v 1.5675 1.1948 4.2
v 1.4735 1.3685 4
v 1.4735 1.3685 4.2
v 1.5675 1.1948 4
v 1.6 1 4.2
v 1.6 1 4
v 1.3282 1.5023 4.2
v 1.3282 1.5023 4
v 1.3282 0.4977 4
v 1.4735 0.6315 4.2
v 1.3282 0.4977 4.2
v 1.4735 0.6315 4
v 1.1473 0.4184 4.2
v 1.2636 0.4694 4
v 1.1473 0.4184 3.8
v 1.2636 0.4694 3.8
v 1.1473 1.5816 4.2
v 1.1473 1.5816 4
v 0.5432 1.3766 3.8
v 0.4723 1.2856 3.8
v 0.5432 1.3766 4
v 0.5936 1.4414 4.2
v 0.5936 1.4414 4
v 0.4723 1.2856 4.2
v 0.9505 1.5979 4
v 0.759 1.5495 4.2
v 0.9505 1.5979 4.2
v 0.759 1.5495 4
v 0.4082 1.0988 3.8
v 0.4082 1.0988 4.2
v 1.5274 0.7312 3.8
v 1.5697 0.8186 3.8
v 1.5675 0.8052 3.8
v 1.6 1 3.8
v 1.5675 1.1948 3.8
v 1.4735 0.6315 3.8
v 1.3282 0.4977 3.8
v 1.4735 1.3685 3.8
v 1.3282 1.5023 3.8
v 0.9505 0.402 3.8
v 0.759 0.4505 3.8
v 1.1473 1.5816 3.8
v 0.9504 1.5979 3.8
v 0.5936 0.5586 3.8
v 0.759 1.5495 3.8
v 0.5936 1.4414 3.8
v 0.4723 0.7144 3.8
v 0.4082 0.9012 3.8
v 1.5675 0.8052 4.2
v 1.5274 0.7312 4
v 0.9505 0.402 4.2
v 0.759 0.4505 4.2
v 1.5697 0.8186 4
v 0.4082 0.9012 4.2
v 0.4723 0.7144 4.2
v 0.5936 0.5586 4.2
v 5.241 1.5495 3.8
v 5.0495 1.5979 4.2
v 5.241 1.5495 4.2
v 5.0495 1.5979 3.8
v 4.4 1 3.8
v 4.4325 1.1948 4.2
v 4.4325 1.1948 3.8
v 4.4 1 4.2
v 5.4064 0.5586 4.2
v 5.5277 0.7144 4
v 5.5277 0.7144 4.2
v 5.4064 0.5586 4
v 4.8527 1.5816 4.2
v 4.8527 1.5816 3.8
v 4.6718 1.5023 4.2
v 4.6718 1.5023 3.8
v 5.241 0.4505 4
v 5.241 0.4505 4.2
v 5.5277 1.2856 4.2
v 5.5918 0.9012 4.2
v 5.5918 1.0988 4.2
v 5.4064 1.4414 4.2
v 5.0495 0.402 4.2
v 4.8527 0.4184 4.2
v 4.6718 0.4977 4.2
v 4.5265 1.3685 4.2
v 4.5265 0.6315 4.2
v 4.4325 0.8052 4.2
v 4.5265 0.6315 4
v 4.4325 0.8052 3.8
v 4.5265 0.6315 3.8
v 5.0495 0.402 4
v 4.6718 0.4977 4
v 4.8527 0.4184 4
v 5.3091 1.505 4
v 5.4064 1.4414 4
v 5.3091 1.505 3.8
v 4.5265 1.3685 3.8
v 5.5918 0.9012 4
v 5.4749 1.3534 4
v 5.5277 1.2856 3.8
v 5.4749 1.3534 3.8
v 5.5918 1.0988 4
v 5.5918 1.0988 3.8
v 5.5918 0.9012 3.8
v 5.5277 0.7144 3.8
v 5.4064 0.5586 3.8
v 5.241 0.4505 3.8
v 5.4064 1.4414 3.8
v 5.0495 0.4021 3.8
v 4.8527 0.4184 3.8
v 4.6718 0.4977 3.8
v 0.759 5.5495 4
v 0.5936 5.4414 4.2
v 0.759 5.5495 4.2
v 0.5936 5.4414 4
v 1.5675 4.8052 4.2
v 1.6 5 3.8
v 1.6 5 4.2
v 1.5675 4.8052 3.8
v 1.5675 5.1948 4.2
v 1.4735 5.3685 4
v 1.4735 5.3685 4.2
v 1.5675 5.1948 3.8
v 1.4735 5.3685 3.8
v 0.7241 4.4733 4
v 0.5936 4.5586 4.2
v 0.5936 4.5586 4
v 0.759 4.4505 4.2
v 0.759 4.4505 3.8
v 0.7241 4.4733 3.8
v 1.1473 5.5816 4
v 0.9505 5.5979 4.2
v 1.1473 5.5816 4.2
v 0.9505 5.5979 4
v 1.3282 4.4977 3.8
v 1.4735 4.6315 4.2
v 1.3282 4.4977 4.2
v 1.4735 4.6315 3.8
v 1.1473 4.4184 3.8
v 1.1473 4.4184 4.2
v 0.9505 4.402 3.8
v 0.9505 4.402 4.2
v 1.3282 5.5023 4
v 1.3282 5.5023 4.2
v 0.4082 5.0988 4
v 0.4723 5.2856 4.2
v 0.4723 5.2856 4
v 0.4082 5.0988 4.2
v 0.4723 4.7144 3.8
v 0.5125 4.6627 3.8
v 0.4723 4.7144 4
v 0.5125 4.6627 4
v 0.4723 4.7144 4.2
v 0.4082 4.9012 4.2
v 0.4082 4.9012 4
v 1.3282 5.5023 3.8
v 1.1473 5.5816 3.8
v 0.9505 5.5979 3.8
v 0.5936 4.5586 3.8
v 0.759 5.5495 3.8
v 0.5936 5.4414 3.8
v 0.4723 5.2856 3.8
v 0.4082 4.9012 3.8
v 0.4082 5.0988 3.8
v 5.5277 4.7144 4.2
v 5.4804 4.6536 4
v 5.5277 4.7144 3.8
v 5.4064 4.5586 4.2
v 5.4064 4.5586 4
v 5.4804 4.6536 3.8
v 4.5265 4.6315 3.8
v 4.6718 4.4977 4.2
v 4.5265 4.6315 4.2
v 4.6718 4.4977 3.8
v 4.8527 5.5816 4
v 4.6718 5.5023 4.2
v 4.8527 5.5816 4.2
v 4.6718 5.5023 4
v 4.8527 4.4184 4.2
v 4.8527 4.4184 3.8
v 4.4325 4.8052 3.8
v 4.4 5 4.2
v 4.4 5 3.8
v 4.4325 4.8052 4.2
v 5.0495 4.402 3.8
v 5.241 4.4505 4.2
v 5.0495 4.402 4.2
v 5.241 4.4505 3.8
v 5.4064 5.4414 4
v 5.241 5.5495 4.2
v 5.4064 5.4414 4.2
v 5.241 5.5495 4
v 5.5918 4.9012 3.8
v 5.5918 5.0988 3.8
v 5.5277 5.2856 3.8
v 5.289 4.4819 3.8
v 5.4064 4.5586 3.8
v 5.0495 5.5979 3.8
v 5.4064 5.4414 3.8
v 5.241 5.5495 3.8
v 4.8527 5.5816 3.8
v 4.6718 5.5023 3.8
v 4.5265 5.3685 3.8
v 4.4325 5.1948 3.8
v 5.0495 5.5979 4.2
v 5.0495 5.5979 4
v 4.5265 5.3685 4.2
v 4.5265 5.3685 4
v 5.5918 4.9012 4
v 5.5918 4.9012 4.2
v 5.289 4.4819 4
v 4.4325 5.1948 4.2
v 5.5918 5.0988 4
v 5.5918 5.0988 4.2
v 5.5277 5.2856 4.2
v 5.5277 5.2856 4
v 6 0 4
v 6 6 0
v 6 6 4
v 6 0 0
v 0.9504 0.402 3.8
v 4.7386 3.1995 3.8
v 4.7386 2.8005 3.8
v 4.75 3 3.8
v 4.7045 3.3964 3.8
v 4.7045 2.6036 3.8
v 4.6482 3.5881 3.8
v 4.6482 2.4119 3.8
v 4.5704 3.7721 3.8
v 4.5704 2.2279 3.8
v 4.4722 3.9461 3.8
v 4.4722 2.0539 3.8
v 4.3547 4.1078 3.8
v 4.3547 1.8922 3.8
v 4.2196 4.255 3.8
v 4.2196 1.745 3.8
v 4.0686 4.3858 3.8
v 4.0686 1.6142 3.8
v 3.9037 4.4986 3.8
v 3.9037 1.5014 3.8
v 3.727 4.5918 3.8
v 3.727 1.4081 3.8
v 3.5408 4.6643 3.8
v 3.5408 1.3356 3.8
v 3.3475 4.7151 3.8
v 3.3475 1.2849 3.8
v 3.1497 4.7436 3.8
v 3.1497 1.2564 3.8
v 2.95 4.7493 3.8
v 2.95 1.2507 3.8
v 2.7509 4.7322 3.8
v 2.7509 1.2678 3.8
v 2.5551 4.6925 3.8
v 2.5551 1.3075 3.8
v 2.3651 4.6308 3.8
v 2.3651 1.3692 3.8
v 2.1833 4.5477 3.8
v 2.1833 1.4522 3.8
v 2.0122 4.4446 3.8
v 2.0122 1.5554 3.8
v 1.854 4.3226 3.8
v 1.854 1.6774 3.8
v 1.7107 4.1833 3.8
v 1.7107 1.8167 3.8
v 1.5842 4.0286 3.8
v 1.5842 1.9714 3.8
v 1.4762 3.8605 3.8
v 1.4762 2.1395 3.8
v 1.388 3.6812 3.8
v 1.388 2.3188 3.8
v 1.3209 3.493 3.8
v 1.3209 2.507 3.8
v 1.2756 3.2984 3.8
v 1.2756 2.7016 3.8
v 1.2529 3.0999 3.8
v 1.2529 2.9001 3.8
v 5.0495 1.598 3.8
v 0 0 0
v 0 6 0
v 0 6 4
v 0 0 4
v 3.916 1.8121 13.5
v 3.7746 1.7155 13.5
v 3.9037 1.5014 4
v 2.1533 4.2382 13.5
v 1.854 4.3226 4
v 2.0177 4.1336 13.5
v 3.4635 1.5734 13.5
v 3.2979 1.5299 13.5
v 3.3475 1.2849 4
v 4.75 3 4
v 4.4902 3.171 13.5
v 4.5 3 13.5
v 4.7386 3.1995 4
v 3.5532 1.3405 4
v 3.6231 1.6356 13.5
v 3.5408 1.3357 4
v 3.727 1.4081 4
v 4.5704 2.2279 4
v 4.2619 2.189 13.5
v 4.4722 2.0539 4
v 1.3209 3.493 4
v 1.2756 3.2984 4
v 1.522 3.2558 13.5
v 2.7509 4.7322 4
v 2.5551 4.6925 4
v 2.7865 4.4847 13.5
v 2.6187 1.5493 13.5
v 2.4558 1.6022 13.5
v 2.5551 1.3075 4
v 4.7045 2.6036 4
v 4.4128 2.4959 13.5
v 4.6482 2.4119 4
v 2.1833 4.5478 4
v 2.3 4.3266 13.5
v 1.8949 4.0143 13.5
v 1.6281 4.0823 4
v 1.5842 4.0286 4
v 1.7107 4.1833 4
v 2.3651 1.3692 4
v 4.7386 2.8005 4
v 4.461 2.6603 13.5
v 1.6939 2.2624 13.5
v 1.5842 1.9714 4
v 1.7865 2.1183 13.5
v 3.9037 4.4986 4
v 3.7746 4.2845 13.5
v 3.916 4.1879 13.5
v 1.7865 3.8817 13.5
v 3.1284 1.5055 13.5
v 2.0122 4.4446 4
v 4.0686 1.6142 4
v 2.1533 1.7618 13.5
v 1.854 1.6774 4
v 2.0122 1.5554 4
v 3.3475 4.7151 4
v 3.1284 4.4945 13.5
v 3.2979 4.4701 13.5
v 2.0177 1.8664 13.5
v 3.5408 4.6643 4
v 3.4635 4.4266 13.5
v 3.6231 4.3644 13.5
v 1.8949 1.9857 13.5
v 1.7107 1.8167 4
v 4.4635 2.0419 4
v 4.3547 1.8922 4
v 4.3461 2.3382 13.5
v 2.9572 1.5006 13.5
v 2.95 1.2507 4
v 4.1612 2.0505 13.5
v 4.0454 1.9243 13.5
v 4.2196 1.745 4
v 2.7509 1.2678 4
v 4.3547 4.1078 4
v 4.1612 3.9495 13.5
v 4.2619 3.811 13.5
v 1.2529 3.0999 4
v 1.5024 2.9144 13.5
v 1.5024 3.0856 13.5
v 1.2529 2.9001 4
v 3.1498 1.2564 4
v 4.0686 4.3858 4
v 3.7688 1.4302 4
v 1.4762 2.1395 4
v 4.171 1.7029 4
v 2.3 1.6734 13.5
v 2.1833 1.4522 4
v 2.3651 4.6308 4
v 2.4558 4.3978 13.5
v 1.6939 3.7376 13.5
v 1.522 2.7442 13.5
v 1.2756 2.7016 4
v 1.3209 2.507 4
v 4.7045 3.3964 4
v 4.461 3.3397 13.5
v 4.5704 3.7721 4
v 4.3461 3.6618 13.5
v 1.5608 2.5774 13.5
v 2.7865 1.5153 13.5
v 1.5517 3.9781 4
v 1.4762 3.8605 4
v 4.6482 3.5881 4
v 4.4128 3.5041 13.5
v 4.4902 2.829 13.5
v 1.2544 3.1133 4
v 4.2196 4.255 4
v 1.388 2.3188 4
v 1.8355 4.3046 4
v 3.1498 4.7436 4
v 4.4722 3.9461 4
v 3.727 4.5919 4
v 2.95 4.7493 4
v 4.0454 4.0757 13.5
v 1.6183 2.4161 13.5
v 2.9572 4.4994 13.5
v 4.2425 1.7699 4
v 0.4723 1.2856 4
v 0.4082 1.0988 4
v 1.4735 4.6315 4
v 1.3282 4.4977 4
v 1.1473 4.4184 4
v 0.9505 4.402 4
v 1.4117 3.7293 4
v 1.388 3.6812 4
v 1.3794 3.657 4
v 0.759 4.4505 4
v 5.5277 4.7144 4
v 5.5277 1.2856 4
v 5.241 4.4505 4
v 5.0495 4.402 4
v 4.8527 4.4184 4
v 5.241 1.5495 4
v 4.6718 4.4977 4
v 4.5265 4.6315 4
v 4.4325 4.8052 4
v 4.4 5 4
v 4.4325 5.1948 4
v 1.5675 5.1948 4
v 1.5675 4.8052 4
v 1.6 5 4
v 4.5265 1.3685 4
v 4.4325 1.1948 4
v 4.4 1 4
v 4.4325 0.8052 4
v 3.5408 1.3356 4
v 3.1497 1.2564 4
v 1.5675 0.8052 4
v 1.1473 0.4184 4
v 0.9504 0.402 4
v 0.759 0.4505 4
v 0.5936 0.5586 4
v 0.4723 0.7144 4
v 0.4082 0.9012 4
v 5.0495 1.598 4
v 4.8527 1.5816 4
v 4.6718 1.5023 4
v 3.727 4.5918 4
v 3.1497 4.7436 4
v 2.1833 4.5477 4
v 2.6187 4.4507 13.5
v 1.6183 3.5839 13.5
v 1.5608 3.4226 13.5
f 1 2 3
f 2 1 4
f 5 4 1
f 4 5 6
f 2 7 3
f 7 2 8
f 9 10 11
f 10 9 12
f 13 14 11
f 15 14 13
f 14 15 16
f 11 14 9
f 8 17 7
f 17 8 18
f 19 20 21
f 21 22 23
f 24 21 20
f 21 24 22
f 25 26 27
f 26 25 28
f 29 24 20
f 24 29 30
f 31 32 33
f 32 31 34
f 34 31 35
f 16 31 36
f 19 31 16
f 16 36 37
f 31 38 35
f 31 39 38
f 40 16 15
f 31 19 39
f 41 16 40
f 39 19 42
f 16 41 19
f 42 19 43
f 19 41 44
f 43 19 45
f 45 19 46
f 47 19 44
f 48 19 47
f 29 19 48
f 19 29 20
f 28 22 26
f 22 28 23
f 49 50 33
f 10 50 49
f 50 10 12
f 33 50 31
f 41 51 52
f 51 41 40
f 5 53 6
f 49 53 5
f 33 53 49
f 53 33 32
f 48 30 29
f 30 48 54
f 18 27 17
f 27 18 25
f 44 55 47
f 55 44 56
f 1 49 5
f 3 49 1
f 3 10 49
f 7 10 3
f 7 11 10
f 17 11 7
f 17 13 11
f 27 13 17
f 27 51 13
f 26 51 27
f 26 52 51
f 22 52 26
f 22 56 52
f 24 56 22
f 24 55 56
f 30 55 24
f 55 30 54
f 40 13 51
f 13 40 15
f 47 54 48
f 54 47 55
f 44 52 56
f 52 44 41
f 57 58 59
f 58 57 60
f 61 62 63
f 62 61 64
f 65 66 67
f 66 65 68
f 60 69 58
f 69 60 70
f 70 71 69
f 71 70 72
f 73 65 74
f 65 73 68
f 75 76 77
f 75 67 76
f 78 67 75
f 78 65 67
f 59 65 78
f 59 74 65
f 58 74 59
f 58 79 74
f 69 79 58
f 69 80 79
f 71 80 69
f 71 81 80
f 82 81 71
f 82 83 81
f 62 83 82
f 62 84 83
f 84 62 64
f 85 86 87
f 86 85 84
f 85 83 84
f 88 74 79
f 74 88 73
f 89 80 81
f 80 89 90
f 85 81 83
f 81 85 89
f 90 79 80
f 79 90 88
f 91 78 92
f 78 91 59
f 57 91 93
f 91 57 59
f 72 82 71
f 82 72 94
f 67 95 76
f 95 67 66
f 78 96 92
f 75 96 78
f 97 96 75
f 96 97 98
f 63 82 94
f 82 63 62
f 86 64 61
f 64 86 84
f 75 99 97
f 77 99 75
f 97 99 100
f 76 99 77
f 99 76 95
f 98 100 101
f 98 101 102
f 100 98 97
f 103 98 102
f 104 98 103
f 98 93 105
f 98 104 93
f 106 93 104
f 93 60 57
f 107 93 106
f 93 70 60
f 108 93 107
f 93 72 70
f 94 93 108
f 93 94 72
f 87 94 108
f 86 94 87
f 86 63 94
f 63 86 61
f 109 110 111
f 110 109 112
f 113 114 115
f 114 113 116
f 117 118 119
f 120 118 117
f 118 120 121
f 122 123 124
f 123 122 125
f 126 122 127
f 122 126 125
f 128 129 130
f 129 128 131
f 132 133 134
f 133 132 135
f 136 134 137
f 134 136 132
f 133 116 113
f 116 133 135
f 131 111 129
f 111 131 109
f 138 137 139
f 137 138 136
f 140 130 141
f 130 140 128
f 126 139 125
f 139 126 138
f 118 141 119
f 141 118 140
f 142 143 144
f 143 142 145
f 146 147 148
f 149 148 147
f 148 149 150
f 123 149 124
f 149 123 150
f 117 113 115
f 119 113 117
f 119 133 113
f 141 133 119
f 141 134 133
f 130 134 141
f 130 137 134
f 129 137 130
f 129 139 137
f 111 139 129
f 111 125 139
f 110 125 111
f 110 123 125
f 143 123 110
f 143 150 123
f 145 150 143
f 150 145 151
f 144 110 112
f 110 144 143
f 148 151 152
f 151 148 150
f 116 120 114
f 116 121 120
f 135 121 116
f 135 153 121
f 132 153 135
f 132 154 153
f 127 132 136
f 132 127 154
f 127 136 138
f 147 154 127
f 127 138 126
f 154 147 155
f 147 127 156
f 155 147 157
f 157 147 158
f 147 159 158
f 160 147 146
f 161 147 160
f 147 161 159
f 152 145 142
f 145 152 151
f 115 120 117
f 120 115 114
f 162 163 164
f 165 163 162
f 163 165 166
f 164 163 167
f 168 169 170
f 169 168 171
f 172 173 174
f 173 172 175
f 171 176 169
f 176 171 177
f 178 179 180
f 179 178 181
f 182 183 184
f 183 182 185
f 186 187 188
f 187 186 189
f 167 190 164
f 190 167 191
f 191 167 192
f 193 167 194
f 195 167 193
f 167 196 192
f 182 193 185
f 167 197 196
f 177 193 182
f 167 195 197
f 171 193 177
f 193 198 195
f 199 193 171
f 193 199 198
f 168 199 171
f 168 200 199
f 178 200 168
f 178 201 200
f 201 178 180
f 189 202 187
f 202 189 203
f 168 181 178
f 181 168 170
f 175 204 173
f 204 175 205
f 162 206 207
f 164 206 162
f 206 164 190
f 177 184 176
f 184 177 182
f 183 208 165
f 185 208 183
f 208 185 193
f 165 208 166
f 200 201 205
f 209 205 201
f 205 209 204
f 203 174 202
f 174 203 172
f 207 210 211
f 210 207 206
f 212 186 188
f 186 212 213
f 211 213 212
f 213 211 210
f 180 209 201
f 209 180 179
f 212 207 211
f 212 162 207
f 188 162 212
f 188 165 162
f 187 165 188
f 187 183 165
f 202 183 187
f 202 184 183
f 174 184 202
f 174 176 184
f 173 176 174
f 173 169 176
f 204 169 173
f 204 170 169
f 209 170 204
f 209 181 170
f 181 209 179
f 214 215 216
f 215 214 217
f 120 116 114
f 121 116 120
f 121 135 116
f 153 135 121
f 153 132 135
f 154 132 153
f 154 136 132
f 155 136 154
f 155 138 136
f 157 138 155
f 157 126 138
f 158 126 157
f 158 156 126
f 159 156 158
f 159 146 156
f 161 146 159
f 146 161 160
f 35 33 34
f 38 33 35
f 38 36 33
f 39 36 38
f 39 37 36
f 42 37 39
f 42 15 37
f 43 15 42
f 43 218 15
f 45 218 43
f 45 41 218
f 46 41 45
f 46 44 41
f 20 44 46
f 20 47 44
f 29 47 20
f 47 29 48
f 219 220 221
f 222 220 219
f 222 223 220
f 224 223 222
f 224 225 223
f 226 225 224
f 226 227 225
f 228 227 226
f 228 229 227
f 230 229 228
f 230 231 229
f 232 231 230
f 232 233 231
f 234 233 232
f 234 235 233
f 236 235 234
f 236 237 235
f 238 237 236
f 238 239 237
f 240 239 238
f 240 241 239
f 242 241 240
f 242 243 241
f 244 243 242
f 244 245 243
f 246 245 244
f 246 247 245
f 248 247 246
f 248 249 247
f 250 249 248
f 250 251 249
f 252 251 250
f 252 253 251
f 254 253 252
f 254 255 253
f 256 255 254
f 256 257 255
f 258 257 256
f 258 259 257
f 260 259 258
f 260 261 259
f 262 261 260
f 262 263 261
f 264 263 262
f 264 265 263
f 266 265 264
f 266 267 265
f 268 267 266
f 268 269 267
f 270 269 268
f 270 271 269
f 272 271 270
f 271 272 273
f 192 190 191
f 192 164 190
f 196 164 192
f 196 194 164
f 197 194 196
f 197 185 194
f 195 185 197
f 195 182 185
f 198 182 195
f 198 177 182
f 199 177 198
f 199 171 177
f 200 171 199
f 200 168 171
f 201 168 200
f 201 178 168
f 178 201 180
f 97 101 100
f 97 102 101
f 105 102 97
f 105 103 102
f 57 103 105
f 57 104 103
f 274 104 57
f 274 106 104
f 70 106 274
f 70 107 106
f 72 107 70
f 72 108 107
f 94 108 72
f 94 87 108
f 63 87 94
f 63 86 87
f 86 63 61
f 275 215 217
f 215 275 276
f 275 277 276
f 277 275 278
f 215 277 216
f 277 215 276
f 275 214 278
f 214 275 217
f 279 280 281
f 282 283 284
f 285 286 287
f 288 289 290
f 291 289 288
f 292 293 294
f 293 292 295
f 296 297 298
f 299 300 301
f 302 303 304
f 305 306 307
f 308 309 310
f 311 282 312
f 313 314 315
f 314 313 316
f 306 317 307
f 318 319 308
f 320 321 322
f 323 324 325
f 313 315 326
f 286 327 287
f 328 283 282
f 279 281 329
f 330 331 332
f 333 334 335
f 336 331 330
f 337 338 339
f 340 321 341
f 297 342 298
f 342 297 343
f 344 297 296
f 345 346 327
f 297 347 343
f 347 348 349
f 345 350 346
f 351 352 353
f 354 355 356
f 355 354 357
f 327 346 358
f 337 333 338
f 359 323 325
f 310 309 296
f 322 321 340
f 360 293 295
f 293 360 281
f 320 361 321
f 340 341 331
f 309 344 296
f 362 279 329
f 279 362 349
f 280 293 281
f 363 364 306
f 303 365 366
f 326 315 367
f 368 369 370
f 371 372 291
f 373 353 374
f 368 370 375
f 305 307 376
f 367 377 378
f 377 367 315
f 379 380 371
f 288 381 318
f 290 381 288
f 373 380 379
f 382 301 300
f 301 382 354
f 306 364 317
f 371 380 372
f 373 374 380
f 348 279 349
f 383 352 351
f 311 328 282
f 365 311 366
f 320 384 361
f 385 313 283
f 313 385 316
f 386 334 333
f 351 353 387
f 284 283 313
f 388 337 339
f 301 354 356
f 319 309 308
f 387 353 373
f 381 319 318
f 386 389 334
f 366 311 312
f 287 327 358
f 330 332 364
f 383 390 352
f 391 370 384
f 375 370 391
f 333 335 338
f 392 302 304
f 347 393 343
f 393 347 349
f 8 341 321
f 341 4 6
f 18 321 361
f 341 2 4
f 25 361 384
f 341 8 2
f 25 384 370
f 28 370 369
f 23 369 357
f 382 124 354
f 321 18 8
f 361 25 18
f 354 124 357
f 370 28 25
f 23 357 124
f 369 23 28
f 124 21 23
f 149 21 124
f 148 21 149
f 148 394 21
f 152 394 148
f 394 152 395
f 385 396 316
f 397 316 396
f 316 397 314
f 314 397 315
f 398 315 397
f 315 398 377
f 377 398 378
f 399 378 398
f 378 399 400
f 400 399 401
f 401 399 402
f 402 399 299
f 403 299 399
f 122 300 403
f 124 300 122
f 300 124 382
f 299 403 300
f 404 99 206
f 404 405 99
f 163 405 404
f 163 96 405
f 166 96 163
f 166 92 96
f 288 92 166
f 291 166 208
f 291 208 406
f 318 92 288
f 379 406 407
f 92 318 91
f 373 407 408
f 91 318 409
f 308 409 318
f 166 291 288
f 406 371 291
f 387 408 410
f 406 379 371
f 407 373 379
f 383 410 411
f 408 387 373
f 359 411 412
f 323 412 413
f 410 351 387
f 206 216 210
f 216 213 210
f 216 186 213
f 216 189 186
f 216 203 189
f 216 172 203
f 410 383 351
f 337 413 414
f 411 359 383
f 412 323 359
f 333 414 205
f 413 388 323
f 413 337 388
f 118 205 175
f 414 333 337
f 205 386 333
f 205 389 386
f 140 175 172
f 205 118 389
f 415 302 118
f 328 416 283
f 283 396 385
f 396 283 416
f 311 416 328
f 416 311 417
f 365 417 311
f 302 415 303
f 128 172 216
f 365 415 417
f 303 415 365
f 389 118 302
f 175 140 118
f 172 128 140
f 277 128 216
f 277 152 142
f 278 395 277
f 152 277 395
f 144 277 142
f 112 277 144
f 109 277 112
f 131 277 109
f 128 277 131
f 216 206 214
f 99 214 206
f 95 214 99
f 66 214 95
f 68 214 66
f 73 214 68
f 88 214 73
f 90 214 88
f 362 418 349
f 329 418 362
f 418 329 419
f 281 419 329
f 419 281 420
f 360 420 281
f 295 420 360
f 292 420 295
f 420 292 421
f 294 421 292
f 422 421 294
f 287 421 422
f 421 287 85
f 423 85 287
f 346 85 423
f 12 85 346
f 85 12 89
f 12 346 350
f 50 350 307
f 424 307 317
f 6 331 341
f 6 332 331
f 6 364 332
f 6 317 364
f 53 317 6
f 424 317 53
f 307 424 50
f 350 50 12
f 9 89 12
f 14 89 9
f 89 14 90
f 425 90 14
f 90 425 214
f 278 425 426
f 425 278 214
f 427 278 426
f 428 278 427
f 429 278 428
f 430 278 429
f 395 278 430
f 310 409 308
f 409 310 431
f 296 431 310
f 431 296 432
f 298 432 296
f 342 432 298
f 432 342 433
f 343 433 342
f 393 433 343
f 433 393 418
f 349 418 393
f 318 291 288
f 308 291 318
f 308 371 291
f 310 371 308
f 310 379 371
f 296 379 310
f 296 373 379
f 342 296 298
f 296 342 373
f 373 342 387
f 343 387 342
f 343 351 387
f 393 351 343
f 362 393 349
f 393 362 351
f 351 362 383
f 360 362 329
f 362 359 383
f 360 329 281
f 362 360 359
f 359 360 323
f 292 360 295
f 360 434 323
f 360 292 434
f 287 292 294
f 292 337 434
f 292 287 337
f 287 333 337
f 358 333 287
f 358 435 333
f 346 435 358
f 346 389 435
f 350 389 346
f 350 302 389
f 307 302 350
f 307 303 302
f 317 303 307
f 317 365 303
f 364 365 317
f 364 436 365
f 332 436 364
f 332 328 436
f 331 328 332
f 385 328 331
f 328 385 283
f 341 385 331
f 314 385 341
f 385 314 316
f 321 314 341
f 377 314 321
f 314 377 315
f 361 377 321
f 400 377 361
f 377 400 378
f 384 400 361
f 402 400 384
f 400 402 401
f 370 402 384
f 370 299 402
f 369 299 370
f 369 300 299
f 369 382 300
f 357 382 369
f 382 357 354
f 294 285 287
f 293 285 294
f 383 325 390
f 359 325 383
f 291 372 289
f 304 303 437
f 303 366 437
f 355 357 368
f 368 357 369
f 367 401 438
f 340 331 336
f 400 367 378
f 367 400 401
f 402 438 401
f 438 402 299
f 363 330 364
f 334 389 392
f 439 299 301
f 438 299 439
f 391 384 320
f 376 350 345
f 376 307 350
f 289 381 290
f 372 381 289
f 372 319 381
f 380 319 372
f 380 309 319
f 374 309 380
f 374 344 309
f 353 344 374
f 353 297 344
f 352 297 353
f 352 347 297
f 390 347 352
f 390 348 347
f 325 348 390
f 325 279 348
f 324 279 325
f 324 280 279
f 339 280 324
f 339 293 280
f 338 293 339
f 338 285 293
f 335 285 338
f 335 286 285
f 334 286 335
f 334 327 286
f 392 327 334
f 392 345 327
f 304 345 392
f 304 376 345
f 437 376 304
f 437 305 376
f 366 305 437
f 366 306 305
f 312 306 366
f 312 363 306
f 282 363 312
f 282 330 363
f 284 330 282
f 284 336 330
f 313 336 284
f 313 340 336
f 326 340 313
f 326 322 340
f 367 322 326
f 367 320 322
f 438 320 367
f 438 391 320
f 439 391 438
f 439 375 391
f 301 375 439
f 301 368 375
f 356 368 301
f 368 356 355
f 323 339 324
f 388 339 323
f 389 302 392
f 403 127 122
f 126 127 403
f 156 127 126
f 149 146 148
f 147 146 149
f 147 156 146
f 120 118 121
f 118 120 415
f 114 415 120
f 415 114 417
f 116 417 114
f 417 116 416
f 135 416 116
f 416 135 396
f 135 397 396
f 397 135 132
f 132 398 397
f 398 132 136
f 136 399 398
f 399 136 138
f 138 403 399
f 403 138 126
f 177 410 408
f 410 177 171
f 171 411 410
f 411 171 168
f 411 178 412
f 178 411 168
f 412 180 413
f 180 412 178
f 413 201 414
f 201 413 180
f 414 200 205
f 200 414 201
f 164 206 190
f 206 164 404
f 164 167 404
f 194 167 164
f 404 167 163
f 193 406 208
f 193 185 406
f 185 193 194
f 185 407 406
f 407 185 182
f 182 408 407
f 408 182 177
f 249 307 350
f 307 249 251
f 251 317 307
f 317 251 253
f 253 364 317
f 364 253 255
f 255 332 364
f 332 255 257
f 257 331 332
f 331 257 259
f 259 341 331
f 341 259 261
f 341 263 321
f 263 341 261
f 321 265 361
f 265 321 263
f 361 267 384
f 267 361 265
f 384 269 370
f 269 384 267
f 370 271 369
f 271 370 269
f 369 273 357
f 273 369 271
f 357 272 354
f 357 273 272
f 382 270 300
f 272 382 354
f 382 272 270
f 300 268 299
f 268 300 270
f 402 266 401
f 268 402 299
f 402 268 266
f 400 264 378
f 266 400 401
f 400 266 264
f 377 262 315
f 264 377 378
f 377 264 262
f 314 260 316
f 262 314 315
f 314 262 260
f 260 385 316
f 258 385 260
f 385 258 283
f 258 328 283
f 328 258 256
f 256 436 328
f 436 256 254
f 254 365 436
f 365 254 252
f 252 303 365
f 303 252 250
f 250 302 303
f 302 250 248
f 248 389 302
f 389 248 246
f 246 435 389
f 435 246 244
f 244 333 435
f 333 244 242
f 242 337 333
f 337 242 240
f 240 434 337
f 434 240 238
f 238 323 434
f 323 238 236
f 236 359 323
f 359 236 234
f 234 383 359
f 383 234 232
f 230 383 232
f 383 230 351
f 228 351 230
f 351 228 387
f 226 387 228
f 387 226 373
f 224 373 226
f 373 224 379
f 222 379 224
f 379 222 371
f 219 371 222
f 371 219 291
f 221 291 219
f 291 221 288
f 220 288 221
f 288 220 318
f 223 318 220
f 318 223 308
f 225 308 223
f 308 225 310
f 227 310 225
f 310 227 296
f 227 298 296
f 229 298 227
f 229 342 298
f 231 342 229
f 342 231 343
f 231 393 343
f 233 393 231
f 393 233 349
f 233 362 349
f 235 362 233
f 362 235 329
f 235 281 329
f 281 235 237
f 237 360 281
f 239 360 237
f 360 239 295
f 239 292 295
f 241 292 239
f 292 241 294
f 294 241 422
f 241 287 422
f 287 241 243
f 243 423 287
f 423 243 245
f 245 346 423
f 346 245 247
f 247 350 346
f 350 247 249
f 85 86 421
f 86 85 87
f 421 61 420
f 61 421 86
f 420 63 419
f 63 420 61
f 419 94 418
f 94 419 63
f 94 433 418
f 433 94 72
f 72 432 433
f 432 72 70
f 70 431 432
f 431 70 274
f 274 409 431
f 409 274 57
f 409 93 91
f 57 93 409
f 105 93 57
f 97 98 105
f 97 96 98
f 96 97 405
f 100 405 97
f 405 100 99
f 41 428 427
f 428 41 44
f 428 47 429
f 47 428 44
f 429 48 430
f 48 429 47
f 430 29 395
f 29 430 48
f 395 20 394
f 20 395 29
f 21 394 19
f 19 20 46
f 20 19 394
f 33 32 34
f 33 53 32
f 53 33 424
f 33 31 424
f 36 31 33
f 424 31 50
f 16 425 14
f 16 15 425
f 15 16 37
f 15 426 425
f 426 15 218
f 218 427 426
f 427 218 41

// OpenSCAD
use <bendlib.scad>;

function button(
    body_dim = undef, 
    mount_dim = undef, 
    pin_dim = undef,
    contact_dim = undef, 
    contact_offset = undef,
    contact_thickness = undef
 ) = let(
    body_dim = bl_def(body_dim, [12, 8.2, 4]),
    mount_dim = bl_def(mount_dim, [6.8, 2]),
    pin_dim = bl_def(pin_dim, [4.5, 2]),
    contact_dim = bl_def(contact_dim, [[13, 4, 0.5], [26, 2, 1]]),
    contact_offset = bl_def(contact_offset, [0,0,3]),
    contact_thickness = bl_def(contact_thickness, 0.2)
    
) [
    body_dim, 
    mount_dim,
    pin_dim,
    contact_dim,
    contact_offset,
    contact_thickness
];

function button_body_dim(type) = type[0];
function button_mount_dim(type) = type[1];
function button_pin_dim(type) = type[2];
function button_contact_dim(type) = type[3];
function button_contact_offset(type) = type[4];
function button_contact_thickness(type) = type[5];


module button_body_shape(type) {
    body_dim = button_body_dim(type);
    intersection() {
        circle(d = body_dim[0]);
        square(bl_2d(body_dim), center=true);
    }
}

module button_mount_diff(type, thickness, tolerance, thickness_tolerance = undef, part_offset = undef) {
    body_dim = button_body_dim(type);
    mount_dim = button_mount_dim(type);
    thickness_tolerance = bl_def(thickness_tolerance, tolerance);
    part_offset = bl_def(part_offset, thickness_tolerance);
    translate([0,0,body_dim[2]+part_offset-thickness_tolerance])
    cylinder(d = mount_dim[0] + tolerance*2, h = thickness + thickness_tolerance*2);
}

module button(type = button()) {
    
    body_dim = button_body_dim(type);
    mount_dim = button_mount_dim(type);
    pin_dim = button_pin_dim(type);
    
    color("black")
    linear_extrude(body_dim[2])
    button_body_shape(type);
    
    color("#111111")
    cylinder(d = mount_dim[0], h = mount_dim[1] + body_dim[2]);
    color("#222222")
    cylinder(d = pin_dim[0], h = pin_dim[1] + mount_dim[1] + body_dim[2]);
    
    
    translate(button_contact_offset(type))
    linear_extrude(button_contact_thickness(type))
    for (c = button_contact_dim(type)) {
        bl_square(c, radius = c[2], center=true);
    }
    
}

$fa = 0.2;
$fs = 0.2;

function push_button(dim = undef, dia = undef, height = undef) = [
    bl_def(dim, [6,6,4,0.2]), 
    bl_def(dia, [3.5,3,1.2]), 
    bl_def(height, 2)
];

function push_button_dim(type) = type[0];
function push_button_dia(type) = type[1];
function push_button_height(type) = type[2];

module push_button(type = push_button()) {
    
    dim = push_button_dim(type);
    dia = push_button_dia(type);
    height = push_button_height(type);
    
    mount_offsets = bl_repeat(4, [1,1]);
    
    color("gray")
    translate([0,0,dim[2]-dim[3]])
    linear_extrude(dim[3])
    difference() {
        square([dim[0],dim[1]]);
        bl_quad_mirror(dim, mount_offsets) {
            circle(d = dia[2]);
        }
        translate(bl_2d(dim)/2)
        circle(d = dia[0]);
    }
    
    color("black") {
        cube([dim[0],dim[1],dim[2]-dim[3]]);
    
        translate([0,0,dim[2]-dim[3]])
        bl_quad_mirror(dim, mount_offsets) {
            cylinder(d = dia[2], h = dim[3]*2);
        }
    
        color("black")
        translate([dim[0]/2,dim[1]/2,dim[2]])
        cylinder(d1 = dia[0], d2 = dia[1], h = height);
    }
}

push_button(push_button(height = 9.5));


/*
button = button();
button(button);
*#button_mount_diff(button, 1.5, 0.2);*/
